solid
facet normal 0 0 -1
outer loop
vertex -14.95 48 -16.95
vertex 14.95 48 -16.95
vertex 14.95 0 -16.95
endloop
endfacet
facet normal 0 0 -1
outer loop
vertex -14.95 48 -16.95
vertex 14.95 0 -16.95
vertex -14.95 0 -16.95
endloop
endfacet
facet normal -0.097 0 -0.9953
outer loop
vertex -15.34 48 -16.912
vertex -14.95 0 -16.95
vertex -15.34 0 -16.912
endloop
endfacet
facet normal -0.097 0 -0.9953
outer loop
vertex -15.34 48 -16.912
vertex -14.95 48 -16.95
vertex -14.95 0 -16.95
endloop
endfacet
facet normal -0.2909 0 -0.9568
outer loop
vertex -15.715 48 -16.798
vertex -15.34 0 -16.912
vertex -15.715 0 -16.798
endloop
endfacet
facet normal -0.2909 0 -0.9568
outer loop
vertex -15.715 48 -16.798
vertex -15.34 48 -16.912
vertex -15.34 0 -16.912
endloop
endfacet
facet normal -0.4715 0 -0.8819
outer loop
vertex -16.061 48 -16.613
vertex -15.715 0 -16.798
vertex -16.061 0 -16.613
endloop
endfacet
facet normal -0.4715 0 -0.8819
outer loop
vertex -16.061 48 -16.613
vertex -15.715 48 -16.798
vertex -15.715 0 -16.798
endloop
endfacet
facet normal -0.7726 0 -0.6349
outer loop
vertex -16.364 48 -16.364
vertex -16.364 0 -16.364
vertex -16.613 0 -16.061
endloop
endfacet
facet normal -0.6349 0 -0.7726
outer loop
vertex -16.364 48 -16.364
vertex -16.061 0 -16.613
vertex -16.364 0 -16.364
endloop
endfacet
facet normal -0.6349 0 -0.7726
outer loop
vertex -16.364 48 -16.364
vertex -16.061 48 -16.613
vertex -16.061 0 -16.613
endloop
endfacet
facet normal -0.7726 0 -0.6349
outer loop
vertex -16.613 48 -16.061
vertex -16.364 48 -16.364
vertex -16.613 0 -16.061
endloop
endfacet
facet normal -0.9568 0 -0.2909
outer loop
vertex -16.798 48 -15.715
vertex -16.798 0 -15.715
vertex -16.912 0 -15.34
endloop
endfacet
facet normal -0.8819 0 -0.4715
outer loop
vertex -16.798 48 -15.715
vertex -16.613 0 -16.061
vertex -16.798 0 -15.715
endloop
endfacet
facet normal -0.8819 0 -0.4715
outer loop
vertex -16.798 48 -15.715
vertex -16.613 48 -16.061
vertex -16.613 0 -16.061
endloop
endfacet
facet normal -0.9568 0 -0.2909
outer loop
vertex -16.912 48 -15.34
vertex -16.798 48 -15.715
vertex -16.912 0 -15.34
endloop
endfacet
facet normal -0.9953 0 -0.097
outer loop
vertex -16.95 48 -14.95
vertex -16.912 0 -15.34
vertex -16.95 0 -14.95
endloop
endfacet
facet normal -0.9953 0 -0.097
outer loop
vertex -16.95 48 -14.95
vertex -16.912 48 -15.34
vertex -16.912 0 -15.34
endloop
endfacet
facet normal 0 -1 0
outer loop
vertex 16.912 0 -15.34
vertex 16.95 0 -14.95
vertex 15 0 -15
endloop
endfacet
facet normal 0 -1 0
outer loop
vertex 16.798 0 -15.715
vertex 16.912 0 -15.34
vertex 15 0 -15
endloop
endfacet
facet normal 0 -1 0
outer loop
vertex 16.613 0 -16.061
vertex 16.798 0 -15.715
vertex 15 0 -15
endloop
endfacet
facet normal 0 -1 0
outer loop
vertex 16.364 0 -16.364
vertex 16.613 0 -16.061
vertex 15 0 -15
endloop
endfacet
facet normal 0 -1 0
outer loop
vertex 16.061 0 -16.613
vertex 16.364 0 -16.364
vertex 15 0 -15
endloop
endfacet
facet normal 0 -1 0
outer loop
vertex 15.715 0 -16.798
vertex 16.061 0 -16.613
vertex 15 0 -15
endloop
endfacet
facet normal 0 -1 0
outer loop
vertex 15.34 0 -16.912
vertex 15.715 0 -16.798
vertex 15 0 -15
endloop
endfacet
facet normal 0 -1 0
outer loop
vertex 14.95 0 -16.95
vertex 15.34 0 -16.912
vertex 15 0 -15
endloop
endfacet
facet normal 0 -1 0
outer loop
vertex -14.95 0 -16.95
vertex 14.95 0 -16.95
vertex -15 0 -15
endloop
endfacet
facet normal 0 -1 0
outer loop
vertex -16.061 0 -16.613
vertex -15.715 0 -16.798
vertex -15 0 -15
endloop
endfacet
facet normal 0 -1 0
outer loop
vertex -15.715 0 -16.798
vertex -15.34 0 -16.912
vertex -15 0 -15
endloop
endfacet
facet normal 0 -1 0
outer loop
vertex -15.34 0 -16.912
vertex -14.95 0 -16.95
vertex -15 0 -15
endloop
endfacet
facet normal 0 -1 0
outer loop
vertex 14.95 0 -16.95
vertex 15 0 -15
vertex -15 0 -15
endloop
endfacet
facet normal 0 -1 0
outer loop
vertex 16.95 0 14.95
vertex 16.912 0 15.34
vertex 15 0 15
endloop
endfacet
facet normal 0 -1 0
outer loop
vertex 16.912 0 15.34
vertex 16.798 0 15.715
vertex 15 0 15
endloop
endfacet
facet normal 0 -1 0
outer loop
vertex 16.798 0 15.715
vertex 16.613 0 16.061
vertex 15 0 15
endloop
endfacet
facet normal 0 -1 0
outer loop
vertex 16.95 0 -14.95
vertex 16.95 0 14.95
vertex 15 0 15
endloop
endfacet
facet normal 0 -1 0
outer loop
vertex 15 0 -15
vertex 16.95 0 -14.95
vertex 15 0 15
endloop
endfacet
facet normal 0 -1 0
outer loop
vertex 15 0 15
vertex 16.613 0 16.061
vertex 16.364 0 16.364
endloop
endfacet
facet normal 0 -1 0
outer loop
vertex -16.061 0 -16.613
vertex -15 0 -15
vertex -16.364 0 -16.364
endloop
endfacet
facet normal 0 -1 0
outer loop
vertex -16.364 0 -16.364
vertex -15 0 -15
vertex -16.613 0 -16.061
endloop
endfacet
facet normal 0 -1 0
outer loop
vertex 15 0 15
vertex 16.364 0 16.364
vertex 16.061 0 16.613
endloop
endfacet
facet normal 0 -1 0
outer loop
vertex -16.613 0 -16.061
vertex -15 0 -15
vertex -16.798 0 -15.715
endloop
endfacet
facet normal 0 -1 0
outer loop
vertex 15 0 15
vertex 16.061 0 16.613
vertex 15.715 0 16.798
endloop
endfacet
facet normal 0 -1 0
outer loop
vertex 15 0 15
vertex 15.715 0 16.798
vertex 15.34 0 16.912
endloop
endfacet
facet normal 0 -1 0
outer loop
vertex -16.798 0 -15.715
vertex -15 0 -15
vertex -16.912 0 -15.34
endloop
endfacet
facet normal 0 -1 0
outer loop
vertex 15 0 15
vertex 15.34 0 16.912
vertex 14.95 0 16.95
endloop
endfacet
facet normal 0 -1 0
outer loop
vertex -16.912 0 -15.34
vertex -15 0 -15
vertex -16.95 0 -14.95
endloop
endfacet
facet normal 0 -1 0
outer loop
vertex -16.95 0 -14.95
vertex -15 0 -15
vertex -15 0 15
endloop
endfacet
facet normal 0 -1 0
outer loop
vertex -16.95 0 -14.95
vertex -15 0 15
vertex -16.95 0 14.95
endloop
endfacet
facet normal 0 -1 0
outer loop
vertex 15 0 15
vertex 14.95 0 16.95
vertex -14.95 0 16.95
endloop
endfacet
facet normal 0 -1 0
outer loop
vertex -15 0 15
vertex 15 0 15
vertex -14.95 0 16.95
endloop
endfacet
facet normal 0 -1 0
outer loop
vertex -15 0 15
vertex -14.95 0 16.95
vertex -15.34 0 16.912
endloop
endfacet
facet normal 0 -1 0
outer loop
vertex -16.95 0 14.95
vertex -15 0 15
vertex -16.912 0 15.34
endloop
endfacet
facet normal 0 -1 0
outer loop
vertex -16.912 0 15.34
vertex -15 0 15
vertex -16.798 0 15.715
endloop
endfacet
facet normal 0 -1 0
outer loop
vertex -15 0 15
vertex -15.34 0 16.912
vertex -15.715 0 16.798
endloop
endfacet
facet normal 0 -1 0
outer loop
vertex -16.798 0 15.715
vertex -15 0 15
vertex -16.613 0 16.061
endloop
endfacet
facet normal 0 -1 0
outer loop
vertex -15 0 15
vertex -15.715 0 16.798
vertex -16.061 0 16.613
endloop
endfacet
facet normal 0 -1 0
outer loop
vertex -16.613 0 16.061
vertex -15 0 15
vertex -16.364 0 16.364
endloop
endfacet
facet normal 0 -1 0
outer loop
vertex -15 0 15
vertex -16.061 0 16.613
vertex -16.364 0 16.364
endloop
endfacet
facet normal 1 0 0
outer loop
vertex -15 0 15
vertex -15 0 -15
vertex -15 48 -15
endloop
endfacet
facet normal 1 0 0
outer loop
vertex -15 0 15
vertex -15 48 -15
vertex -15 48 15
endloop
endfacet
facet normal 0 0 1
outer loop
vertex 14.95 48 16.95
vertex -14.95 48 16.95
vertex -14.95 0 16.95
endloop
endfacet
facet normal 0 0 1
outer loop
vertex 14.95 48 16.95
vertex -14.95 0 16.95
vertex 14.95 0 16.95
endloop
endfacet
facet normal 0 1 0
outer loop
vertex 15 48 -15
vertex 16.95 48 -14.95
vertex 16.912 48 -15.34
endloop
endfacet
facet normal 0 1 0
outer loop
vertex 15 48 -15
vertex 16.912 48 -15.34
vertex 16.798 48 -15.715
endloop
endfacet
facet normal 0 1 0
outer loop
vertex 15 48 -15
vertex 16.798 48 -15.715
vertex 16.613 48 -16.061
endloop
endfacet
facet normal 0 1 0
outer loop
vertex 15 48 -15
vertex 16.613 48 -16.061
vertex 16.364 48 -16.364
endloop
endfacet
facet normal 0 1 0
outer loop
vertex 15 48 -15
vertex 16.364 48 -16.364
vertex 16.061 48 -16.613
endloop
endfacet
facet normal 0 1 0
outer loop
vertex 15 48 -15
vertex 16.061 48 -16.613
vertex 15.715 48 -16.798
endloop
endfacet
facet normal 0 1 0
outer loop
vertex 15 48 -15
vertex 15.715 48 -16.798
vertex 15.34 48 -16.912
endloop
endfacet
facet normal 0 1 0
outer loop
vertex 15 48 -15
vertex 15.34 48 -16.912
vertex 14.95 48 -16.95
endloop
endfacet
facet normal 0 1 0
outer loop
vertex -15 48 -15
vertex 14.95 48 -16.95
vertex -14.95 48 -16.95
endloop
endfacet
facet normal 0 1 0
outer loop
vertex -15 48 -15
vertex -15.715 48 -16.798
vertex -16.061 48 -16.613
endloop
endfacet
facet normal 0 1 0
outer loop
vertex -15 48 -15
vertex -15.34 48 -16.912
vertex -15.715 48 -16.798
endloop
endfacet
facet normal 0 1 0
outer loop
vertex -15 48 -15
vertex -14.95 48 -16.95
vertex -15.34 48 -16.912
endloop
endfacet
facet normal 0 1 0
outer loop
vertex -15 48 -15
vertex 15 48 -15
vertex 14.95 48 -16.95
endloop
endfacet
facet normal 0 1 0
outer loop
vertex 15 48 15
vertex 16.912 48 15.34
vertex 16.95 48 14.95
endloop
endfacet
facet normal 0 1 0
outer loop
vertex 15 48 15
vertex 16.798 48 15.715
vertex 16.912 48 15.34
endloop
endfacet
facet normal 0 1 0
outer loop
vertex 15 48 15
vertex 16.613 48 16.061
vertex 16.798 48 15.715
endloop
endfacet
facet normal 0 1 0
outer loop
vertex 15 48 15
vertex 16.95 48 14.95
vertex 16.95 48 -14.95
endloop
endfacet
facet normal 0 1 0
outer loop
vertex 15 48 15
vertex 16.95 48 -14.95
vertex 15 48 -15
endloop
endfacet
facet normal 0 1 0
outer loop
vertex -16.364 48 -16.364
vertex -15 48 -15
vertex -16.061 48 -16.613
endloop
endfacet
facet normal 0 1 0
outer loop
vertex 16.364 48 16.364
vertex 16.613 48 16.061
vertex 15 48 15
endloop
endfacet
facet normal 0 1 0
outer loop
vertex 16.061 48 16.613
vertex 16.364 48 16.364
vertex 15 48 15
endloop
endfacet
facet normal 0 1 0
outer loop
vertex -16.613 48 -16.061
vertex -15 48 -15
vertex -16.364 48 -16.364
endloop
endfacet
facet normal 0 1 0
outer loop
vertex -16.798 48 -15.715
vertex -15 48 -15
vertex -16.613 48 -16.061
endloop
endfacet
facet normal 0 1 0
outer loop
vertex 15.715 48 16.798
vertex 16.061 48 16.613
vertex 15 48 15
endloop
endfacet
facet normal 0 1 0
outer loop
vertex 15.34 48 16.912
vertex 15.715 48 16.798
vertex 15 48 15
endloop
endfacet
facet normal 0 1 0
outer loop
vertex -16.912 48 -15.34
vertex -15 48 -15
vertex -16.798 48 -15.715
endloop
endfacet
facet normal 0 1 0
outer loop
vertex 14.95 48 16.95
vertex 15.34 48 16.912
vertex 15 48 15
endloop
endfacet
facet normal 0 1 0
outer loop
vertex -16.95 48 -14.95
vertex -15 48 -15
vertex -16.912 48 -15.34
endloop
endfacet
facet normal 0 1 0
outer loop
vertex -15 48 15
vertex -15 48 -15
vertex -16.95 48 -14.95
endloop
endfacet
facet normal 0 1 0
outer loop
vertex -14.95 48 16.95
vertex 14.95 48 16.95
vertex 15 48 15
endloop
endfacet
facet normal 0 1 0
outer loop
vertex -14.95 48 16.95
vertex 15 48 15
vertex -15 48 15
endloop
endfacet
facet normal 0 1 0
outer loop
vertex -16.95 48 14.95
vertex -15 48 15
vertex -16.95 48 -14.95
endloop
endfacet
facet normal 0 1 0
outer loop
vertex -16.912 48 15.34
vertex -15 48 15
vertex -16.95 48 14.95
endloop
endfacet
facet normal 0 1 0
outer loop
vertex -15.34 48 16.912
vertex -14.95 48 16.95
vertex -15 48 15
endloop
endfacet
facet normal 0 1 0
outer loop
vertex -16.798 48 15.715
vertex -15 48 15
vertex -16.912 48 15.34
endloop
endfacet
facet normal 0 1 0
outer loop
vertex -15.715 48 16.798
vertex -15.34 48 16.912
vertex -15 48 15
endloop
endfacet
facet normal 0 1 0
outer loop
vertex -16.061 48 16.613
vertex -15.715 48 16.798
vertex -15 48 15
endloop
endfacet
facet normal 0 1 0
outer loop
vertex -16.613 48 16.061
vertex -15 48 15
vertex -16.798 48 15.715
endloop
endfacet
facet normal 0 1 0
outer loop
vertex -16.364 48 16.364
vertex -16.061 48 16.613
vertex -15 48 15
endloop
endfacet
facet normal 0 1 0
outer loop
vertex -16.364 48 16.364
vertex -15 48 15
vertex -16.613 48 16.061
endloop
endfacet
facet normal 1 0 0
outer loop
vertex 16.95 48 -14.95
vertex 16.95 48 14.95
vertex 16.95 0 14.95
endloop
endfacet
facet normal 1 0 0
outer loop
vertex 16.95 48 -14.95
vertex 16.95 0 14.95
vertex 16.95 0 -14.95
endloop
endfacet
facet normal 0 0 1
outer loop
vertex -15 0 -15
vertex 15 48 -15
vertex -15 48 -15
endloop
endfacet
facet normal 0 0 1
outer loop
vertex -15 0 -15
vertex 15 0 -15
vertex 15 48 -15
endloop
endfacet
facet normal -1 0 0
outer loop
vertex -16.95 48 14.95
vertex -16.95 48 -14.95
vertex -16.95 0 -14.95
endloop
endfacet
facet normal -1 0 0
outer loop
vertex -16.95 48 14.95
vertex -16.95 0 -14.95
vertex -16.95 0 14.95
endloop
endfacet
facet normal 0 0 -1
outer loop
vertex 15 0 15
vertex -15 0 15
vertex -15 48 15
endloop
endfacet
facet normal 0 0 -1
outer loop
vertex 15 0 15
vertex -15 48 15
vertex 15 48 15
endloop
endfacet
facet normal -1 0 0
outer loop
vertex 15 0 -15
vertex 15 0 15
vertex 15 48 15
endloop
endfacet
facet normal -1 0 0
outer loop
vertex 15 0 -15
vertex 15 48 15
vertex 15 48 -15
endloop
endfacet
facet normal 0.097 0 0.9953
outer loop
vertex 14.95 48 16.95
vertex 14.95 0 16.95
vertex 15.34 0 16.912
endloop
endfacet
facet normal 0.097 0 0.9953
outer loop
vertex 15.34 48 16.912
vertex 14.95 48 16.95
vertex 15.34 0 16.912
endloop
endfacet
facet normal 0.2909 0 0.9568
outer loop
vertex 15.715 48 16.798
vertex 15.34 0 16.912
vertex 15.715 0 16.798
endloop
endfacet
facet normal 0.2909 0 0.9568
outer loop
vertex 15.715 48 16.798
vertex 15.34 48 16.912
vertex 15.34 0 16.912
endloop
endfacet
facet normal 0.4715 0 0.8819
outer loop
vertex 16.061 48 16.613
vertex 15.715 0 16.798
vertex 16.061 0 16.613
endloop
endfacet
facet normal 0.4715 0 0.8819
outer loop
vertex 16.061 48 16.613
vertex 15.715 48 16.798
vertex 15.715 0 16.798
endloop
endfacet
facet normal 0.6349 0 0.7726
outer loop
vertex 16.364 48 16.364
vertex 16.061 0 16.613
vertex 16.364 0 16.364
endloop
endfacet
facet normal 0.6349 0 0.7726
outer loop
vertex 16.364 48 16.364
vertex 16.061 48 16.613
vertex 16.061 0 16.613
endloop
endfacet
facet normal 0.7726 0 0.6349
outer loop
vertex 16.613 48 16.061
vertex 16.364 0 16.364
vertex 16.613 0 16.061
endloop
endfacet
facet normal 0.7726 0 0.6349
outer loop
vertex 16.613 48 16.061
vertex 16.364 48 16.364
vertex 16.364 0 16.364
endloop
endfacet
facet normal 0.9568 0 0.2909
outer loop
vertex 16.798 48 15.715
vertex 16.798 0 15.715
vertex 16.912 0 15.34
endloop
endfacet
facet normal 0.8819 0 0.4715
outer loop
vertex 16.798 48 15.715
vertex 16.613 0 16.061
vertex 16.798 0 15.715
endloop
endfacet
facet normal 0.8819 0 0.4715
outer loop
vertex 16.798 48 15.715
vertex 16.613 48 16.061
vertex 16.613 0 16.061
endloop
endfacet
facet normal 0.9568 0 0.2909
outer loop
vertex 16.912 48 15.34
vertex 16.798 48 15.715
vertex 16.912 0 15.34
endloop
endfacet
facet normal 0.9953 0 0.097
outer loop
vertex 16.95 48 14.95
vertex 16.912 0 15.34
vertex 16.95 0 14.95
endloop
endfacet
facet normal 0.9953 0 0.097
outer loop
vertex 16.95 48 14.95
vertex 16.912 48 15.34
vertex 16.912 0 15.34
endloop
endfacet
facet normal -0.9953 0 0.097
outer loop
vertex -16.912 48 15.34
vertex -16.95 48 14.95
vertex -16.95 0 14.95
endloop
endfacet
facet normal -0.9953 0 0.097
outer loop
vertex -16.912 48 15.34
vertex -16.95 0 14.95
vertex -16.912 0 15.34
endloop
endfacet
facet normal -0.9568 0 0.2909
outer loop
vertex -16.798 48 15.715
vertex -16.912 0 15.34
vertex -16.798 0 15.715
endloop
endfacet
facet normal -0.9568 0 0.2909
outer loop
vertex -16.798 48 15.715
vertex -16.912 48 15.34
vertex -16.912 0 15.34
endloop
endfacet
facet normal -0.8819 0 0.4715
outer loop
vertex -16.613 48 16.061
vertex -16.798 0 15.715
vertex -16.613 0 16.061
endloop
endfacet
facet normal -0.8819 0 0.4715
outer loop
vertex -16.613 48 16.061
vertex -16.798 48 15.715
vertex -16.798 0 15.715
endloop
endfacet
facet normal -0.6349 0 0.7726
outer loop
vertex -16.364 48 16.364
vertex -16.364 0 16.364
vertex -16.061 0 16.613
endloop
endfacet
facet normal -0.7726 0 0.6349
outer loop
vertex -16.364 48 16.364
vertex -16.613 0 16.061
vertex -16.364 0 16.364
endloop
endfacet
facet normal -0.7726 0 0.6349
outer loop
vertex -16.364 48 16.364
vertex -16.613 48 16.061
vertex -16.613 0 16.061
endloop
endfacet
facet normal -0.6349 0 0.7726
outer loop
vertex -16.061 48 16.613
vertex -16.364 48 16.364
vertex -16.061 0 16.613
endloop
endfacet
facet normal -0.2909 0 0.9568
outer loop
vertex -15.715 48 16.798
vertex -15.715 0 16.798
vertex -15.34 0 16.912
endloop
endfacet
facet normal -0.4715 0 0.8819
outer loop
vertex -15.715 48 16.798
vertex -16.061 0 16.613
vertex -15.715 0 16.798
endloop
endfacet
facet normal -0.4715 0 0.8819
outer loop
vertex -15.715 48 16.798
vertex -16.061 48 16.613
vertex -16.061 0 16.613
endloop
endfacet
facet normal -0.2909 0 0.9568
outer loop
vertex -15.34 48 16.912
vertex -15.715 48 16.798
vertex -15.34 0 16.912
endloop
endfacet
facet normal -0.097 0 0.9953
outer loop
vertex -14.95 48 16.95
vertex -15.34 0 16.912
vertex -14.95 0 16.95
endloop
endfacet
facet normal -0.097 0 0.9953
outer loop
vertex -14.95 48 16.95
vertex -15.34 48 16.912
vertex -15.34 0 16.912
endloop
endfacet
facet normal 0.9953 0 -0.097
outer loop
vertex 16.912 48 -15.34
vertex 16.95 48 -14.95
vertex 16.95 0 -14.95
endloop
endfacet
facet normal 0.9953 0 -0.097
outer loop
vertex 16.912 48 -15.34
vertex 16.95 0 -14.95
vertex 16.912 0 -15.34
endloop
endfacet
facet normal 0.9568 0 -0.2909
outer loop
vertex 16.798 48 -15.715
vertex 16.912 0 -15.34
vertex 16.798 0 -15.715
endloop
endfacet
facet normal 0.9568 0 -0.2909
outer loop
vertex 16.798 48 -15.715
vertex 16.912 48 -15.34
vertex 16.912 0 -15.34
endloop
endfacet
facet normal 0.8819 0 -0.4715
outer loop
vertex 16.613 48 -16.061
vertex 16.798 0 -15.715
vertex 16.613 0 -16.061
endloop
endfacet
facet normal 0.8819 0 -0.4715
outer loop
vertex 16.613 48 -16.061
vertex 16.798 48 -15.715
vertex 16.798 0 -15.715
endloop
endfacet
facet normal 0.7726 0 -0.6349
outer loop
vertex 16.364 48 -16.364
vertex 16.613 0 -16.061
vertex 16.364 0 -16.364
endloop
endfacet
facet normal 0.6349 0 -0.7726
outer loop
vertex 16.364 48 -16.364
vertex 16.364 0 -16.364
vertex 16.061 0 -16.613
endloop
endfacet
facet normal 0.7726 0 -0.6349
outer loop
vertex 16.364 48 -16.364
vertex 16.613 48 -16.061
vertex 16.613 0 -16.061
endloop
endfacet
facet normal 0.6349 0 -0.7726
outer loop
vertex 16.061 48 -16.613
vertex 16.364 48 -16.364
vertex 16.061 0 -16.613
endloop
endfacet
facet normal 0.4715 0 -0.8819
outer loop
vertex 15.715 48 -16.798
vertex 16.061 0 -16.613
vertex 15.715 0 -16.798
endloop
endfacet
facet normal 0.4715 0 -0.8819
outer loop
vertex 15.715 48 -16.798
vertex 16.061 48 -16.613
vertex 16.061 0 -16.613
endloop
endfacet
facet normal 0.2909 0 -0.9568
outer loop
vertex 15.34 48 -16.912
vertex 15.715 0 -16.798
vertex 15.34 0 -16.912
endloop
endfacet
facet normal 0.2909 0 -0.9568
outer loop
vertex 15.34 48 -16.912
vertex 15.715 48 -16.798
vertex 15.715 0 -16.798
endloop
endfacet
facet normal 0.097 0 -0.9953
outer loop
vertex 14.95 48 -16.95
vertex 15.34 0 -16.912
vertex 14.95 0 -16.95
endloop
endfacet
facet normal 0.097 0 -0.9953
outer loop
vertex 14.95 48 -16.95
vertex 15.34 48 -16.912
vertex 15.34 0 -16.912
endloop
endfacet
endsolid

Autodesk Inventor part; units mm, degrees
ref_plane "YZ Plane" through (0, 0, 0) normal (1, 0, 0) x (0, 1, 0)
ref_plane "XZ Plane" through (0, 0, 0) normal (0, 1, 0) x (-1, 0, 0)
ref_plane "XY Plane" through (0, 0, 0) normal (0, 0, 1) x (1, 0, 0)
sketch "Sketch1" plane through (0, 0, 0) normal (0, 1, 0) x (-1, 0, 0)
  line L0 (-16.95, -16.95) -> (16.95, -16.95)
  line L1 (16.95, -16.95) -> (16.95, 16.95)
  line L2 (16.95, 16.95) -> (-16.95, 16.95)
  line L3 (-16.95, 16.95) -> (-16.95, -16.95)
  line L4 (-16.95, -16.95) -> (16.95, 16.95) construction
  line L5 (16.95, -16.95) -> (-16.95, 16.95) construction
  line L6 (-15, -15) -> (15, -15)
  line L7 (15, -15) -> (15, 15)
  line L8 (15, 15) -> (-15, 15)
  line L9 (-15, 15) -> (-15, -15)
  line L10 (-15, -15) -> (15, 15) construction
  line L11 (15, -15) -> (-15, 15) construction
  point P0 (0, 0)
  dimension "d0" = 33.9
  dimension "d1" = 33.9
  dimension "d2" = 30
  dimension "d3" = 30
extrude "Extrusion1" add sketch "Sketch1" along normal blind 48
fillet "Fillet1" radius 2 4 edges at (16.95, 24, 16.95) (16.95, 24, -16.95) (-16.95, 24, -16.95) (-16.95, 24, 16.95)
properties part number "00_Laser_match_housing"
